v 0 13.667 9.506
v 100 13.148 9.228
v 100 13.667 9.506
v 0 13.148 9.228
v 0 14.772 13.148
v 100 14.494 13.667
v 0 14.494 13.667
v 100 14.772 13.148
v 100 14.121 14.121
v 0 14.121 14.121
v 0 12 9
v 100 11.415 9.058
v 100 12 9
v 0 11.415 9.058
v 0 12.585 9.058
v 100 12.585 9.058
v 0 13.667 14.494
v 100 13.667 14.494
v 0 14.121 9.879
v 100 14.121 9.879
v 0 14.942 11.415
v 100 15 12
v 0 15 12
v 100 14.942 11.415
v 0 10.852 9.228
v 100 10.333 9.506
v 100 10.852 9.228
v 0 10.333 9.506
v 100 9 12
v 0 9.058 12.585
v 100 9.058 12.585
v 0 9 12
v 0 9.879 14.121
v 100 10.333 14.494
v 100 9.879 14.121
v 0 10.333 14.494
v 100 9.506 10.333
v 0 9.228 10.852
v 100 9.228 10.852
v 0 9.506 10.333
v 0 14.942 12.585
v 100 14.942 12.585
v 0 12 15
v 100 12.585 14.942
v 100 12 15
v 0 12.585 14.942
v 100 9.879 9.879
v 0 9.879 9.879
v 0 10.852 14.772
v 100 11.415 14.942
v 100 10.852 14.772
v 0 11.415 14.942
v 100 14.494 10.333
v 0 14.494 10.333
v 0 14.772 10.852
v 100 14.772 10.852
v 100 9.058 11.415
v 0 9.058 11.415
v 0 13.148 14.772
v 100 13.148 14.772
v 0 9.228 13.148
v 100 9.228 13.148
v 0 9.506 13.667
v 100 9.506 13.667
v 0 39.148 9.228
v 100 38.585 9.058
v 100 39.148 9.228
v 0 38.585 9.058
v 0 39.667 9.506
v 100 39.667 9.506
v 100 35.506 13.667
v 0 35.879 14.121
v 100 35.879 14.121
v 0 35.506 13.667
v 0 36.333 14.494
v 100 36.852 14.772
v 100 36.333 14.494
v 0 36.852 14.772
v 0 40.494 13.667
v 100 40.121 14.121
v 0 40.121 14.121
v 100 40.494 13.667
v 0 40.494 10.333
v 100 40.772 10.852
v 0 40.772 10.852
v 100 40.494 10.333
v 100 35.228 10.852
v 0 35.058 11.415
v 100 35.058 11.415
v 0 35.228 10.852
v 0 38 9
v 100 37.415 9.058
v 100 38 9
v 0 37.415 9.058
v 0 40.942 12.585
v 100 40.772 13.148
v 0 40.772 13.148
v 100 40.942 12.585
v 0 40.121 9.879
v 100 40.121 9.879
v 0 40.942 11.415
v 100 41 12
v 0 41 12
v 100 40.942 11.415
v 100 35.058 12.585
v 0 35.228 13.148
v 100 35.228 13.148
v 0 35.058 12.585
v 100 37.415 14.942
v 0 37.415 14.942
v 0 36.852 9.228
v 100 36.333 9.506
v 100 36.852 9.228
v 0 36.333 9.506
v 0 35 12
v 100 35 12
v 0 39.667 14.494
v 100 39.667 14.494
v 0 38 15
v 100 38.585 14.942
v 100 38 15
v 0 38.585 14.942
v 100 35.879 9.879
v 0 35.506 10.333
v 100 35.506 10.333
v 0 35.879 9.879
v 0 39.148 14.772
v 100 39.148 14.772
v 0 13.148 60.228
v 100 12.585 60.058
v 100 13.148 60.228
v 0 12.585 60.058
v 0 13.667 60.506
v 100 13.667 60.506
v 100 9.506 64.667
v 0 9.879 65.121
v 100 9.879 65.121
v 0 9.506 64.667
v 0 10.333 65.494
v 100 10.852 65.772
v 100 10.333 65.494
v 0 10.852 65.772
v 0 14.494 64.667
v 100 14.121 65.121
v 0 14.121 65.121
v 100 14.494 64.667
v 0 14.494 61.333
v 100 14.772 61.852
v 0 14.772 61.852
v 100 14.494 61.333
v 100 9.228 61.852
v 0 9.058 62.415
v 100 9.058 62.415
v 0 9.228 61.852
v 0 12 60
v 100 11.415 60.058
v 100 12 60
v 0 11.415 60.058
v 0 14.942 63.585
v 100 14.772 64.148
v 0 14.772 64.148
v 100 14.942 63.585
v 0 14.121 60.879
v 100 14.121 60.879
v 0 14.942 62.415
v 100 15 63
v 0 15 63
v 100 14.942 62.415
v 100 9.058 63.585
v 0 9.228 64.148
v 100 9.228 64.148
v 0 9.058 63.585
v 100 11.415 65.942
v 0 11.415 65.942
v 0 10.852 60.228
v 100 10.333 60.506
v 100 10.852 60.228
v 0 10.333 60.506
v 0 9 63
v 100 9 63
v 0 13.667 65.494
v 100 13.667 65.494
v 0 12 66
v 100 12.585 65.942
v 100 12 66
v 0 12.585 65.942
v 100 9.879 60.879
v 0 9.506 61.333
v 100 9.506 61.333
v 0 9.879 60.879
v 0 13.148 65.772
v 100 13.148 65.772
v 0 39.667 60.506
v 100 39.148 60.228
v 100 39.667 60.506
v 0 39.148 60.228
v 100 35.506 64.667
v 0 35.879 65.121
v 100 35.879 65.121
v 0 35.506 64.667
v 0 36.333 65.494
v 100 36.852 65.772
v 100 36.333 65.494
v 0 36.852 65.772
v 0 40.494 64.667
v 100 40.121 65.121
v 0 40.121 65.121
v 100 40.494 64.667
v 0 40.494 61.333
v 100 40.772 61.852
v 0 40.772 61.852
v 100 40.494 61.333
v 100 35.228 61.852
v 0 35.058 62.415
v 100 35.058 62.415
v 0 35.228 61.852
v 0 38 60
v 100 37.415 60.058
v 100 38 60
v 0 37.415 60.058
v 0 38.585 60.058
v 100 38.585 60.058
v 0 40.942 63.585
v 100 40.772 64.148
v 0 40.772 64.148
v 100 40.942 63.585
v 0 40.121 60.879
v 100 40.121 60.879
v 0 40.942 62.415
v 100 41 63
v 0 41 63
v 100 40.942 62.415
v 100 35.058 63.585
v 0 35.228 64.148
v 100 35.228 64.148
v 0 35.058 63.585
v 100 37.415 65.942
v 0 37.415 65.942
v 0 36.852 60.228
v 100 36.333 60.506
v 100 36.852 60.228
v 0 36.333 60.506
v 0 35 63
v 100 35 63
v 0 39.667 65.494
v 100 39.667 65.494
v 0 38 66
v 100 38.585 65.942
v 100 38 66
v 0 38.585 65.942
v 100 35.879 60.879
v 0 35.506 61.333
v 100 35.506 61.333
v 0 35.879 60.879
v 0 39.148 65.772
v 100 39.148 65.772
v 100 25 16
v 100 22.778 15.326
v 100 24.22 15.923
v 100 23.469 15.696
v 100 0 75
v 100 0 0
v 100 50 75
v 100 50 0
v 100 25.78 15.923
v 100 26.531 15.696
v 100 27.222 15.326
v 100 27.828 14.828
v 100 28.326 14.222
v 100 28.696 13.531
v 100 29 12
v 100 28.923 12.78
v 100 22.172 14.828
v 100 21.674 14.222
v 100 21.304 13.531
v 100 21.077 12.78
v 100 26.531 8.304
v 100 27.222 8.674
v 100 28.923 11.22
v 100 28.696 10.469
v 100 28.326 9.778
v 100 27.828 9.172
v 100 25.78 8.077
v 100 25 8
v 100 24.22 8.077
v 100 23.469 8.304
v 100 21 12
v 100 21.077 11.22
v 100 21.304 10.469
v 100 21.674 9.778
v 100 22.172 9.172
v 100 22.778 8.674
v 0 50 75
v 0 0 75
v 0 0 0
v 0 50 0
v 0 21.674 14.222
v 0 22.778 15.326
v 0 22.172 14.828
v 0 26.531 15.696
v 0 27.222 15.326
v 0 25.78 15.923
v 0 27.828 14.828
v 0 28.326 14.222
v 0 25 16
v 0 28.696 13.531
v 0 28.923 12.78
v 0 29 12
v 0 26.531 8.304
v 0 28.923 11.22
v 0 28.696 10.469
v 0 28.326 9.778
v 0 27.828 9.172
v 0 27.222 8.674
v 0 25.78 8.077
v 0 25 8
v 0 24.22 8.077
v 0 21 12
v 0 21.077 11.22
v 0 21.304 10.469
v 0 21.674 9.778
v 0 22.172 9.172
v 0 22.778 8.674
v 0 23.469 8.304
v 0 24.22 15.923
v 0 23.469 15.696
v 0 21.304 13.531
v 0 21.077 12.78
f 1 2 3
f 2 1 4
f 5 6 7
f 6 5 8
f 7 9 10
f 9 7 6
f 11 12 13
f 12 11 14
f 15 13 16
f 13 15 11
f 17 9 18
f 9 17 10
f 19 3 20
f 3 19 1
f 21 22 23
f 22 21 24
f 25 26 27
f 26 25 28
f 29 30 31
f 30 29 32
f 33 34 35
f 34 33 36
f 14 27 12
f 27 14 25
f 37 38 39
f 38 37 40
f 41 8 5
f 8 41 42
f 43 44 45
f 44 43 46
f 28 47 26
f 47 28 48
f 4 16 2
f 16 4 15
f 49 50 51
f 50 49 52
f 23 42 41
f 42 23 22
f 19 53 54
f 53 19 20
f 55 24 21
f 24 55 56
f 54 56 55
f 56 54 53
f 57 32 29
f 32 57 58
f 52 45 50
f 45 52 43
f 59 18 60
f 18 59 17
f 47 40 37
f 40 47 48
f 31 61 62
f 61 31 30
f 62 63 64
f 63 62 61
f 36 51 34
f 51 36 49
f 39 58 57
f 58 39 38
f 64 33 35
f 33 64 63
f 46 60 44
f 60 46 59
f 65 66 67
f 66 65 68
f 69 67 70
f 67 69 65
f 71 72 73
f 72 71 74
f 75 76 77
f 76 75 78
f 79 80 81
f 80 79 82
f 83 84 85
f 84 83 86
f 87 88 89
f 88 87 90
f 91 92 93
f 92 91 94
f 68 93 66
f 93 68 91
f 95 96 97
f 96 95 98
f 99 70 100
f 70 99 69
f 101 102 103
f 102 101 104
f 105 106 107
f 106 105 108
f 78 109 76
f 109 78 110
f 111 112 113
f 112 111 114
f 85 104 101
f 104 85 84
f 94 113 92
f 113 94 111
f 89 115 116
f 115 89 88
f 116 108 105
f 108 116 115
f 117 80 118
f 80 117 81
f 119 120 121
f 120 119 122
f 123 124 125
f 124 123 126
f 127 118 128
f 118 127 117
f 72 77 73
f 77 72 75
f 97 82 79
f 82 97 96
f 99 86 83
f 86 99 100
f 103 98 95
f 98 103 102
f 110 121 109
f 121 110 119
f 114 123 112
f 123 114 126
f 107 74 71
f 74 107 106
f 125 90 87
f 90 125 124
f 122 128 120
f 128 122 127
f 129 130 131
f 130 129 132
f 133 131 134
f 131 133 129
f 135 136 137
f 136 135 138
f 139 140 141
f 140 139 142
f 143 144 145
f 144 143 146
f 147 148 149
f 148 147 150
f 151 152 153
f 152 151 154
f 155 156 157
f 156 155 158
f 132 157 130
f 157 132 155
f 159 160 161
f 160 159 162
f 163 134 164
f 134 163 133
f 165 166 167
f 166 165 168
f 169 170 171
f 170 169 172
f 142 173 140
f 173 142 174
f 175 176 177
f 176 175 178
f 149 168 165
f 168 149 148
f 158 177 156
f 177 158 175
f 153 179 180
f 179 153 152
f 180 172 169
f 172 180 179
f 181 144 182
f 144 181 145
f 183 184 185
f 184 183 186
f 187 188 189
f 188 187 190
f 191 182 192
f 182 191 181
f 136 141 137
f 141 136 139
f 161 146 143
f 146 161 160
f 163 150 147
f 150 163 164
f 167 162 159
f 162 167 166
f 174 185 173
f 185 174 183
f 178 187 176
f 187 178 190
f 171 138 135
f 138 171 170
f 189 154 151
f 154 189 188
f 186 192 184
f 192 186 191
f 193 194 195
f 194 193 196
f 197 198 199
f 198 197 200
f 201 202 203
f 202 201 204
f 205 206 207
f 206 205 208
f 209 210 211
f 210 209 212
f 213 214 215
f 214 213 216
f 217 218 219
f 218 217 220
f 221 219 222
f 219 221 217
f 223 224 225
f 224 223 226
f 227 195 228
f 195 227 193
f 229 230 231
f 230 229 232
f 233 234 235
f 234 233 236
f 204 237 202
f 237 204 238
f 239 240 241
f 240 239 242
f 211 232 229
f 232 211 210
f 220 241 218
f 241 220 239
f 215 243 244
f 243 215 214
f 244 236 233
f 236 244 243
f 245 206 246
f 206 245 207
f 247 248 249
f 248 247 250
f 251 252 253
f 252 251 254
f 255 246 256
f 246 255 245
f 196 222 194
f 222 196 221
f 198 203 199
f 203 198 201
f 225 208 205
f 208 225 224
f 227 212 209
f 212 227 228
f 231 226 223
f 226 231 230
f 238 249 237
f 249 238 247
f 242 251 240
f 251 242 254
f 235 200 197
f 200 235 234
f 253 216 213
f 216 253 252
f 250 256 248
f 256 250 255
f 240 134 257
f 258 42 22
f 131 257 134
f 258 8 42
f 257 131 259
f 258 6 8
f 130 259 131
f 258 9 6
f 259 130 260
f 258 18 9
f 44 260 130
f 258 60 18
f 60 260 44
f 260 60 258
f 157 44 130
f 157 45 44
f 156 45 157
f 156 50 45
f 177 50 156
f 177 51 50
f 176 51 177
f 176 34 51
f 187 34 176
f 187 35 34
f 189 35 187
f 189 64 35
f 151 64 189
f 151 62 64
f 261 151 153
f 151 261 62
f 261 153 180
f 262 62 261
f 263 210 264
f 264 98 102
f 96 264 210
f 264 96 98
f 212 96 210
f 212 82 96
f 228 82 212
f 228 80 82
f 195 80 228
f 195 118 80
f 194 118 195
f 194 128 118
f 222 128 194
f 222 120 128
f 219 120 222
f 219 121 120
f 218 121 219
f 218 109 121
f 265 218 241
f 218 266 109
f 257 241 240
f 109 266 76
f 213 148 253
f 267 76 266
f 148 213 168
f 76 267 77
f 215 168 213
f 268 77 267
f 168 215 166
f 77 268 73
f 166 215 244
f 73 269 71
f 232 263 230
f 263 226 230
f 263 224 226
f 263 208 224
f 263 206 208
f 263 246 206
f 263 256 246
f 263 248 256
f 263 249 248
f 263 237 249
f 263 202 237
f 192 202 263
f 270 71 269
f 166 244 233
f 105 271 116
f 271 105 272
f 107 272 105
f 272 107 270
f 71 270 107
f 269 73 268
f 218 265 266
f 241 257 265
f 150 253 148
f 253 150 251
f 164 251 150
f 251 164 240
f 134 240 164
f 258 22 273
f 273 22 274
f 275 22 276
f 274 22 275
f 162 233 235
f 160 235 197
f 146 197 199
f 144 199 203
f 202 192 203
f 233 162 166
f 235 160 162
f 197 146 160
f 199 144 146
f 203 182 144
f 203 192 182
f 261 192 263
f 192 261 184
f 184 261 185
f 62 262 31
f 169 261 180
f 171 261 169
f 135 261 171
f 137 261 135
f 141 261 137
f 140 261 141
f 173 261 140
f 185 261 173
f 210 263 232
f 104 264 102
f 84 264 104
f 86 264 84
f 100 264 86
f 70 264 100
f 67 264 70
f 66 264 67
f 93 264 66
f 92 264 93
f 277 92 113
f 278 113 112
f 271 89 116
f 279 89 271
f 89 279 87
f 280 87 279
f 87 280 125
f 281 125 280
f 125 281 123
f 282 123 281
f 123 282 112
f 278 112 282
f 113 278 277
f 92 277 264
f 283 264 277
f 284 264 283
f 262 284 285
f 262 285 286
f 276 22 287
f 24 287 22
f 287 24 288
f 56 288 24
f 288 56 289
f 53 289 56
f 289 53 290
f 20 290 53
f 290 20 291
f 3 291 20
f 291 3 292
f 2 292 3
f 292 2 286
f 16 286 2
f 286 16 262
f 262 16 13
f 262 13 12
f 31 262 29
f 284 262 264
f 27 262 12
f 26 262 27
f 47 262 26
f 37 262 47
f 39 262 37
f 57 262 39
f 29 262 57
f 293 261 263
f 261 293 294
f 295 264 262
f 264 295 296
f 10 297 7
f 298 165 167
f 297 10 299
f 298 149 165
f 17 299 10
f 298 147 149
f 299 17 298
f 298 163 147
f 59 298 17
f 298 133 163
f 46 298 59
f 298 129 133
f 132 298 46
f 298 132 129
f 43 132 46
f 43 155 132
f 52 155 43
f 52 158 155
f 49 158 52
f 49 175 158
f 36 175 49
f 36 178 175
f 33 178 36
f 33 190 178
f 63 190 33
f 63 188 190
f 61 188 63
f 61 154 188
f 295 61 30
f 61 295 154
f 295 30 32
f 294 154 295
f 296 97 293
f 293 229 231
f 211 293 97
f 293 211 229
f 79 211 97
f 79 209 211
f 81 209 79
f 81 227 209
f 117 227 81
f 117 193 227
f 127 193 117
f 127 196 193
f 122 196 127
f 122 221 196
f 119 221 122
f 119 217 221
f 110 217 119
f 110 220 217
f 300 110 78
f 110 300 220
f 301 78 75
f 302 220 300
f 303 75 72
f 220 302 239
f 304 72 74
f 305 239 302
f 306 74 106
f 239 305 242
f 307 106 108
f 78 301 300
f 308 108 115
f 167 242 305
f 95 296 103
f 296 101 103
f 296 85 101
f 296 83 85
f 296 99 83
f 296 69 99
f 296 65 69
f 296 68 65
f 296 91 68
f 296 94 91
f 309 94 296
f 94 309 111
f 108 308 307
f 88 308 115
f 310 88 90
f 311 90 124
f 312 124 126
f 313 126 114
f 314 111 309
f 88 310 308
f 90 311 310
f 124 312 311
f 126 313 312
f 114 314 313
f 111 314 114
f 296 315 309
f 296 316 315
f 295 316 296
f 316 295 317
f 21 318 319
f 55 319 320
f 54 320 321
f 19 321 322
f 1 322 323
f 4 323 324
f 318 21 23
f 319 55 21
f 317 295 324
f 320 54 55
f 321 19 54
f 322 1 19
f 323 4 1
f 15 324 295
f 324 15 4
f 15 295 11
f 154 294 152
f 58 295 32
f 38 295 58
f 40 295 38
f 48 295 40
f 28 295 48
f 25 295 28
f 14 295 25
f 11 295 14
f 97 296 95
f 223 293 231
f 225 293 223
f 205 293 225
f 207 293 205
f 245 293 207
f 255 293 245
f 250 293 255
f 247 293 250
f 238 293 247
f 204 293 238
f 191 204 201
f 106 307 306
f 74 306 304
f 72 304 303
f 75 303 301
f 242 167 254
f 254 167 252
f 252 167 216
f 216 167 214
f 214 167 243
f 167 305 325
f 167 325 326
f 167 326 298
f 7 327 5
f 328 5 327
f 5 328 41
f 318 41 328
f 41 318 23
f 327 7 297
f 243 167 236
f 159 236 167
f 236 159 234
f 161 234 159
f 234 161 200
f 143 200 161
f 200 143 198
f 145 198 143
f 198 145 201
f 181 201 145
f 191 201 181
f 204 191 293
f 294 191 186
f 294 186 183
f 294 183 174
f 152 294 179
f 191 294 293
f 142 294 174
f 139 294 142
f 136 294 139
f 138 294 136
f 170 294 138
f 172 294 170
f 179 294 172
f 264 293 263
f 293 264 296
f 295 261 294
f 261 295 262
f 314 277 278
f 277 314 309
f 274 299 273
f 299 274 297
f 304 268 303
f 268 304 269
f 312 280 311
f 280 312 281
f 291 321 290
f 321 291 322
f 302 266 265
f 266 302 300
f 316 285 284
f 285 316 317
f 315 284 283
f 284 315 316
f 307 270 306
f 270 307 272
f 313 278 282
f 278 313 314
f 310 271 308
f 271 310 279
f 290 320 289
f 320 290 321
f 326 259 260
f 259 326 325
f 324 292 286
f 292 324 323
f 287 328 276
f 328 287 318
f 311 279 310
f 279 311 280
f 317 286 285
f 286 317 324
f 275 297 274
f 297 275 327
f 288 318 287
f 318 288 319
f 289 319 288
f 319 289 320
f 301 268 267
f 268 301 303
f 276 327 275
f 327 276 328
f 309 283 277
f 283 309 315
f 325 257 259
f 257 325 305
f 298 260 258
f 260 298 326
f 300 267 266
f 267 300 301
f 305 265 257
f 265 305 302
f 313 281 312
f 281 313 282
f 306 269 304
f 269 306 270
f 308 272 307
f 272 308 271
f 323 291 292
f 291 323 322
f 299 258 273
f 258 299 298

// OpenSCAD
// scad/cantilever_arm.scad
// Parametric cantilever arm bracket (box envelope).
// Wall-mounted at x_min (4 bolts), tip-loaded at x_max (bottom-centre disk).
// Topology optimizer carves the envelope to produce a Michell truss.
//
// All caps variables are injected via -D flags from openscad_runner.py.
// Do not hardcode dimensions here — edit scad/cantilever_arm_params.json instead.

// ── Parameters ────────────────────────────────────────────────────────────
LENGTH                 = 100.0;  // X — wall → load tip
WIDTH                  = 50.0;   // Y — bracket width
HEIGHT                 = 75.0;   // Z — bracket height

WALL_HOLE_DIAMETER     = 6.0;    // M5 clearance for wall bolts
WALL_HOLE_INSET        = 12.0;   // inset from Y/Z edges of x_min face

LOAD_HOLE_DIAMETER     = 8.0;    // pin/eye-bolt clearance at load tip
LOAD_HOLE_OFFSET_Z     = 12.0;   // how far above bottom face the load point sits

// ── Derived ───────────────────────────────────────────────────────────────
wall_hole_r  = WALL_HOLE_DIAMETER  / 2;
load_hole_r  = LOAD_HOLE_DIAMETER  / 2;
fn_curve     = 32;

// ── Solid block ───────────────────────────────────────────────────────────
module block() {
    cube([LENGTH, WIDTH, HEIGHT]);
}

// ── Wall-mount holes (4 corners of x_min face, drilled through X) ─────────
module wall_holes() {
    positions = [
        [WALL_HOLE_INSET,          WALL_HOLE_INSET          ],
        [WIDTH  - WALL_HOLE_INSET, WALL_HOLE_INSET          ],
        [WALL_HOLE_INSET,          HEIGHT - WALL_HOLE_INSET ],
        [WIDTH  - WALL_HOLE_INSET, HEIGHT - WALL_HOLE_INSET ],
    ];
    for (pos = positions) {
        translate([-1, pos[0], pos[1]])
            rotate([0, 90, 0])
                cylinder(r=wall_hole_r, h=LENGTH + 2, $fn=fn_curve);
    }
}

// ── Load hole (single hole at x_max face, y-centered, near bottom) ────────
module load_hole() {
    translate([-1, WIDTH / 2, LOAD_HOLE_OFFSET_Z])
        rotate([0, 90, 0])
            cylinder(r=load_hole_r, h=LENGTH + 2, $fn=fn_curve);
}

// ── Assembly ──────────────────────────────────────────────────────────────
difference() {
    block();
    wall_holes();
    load_hole();
}
